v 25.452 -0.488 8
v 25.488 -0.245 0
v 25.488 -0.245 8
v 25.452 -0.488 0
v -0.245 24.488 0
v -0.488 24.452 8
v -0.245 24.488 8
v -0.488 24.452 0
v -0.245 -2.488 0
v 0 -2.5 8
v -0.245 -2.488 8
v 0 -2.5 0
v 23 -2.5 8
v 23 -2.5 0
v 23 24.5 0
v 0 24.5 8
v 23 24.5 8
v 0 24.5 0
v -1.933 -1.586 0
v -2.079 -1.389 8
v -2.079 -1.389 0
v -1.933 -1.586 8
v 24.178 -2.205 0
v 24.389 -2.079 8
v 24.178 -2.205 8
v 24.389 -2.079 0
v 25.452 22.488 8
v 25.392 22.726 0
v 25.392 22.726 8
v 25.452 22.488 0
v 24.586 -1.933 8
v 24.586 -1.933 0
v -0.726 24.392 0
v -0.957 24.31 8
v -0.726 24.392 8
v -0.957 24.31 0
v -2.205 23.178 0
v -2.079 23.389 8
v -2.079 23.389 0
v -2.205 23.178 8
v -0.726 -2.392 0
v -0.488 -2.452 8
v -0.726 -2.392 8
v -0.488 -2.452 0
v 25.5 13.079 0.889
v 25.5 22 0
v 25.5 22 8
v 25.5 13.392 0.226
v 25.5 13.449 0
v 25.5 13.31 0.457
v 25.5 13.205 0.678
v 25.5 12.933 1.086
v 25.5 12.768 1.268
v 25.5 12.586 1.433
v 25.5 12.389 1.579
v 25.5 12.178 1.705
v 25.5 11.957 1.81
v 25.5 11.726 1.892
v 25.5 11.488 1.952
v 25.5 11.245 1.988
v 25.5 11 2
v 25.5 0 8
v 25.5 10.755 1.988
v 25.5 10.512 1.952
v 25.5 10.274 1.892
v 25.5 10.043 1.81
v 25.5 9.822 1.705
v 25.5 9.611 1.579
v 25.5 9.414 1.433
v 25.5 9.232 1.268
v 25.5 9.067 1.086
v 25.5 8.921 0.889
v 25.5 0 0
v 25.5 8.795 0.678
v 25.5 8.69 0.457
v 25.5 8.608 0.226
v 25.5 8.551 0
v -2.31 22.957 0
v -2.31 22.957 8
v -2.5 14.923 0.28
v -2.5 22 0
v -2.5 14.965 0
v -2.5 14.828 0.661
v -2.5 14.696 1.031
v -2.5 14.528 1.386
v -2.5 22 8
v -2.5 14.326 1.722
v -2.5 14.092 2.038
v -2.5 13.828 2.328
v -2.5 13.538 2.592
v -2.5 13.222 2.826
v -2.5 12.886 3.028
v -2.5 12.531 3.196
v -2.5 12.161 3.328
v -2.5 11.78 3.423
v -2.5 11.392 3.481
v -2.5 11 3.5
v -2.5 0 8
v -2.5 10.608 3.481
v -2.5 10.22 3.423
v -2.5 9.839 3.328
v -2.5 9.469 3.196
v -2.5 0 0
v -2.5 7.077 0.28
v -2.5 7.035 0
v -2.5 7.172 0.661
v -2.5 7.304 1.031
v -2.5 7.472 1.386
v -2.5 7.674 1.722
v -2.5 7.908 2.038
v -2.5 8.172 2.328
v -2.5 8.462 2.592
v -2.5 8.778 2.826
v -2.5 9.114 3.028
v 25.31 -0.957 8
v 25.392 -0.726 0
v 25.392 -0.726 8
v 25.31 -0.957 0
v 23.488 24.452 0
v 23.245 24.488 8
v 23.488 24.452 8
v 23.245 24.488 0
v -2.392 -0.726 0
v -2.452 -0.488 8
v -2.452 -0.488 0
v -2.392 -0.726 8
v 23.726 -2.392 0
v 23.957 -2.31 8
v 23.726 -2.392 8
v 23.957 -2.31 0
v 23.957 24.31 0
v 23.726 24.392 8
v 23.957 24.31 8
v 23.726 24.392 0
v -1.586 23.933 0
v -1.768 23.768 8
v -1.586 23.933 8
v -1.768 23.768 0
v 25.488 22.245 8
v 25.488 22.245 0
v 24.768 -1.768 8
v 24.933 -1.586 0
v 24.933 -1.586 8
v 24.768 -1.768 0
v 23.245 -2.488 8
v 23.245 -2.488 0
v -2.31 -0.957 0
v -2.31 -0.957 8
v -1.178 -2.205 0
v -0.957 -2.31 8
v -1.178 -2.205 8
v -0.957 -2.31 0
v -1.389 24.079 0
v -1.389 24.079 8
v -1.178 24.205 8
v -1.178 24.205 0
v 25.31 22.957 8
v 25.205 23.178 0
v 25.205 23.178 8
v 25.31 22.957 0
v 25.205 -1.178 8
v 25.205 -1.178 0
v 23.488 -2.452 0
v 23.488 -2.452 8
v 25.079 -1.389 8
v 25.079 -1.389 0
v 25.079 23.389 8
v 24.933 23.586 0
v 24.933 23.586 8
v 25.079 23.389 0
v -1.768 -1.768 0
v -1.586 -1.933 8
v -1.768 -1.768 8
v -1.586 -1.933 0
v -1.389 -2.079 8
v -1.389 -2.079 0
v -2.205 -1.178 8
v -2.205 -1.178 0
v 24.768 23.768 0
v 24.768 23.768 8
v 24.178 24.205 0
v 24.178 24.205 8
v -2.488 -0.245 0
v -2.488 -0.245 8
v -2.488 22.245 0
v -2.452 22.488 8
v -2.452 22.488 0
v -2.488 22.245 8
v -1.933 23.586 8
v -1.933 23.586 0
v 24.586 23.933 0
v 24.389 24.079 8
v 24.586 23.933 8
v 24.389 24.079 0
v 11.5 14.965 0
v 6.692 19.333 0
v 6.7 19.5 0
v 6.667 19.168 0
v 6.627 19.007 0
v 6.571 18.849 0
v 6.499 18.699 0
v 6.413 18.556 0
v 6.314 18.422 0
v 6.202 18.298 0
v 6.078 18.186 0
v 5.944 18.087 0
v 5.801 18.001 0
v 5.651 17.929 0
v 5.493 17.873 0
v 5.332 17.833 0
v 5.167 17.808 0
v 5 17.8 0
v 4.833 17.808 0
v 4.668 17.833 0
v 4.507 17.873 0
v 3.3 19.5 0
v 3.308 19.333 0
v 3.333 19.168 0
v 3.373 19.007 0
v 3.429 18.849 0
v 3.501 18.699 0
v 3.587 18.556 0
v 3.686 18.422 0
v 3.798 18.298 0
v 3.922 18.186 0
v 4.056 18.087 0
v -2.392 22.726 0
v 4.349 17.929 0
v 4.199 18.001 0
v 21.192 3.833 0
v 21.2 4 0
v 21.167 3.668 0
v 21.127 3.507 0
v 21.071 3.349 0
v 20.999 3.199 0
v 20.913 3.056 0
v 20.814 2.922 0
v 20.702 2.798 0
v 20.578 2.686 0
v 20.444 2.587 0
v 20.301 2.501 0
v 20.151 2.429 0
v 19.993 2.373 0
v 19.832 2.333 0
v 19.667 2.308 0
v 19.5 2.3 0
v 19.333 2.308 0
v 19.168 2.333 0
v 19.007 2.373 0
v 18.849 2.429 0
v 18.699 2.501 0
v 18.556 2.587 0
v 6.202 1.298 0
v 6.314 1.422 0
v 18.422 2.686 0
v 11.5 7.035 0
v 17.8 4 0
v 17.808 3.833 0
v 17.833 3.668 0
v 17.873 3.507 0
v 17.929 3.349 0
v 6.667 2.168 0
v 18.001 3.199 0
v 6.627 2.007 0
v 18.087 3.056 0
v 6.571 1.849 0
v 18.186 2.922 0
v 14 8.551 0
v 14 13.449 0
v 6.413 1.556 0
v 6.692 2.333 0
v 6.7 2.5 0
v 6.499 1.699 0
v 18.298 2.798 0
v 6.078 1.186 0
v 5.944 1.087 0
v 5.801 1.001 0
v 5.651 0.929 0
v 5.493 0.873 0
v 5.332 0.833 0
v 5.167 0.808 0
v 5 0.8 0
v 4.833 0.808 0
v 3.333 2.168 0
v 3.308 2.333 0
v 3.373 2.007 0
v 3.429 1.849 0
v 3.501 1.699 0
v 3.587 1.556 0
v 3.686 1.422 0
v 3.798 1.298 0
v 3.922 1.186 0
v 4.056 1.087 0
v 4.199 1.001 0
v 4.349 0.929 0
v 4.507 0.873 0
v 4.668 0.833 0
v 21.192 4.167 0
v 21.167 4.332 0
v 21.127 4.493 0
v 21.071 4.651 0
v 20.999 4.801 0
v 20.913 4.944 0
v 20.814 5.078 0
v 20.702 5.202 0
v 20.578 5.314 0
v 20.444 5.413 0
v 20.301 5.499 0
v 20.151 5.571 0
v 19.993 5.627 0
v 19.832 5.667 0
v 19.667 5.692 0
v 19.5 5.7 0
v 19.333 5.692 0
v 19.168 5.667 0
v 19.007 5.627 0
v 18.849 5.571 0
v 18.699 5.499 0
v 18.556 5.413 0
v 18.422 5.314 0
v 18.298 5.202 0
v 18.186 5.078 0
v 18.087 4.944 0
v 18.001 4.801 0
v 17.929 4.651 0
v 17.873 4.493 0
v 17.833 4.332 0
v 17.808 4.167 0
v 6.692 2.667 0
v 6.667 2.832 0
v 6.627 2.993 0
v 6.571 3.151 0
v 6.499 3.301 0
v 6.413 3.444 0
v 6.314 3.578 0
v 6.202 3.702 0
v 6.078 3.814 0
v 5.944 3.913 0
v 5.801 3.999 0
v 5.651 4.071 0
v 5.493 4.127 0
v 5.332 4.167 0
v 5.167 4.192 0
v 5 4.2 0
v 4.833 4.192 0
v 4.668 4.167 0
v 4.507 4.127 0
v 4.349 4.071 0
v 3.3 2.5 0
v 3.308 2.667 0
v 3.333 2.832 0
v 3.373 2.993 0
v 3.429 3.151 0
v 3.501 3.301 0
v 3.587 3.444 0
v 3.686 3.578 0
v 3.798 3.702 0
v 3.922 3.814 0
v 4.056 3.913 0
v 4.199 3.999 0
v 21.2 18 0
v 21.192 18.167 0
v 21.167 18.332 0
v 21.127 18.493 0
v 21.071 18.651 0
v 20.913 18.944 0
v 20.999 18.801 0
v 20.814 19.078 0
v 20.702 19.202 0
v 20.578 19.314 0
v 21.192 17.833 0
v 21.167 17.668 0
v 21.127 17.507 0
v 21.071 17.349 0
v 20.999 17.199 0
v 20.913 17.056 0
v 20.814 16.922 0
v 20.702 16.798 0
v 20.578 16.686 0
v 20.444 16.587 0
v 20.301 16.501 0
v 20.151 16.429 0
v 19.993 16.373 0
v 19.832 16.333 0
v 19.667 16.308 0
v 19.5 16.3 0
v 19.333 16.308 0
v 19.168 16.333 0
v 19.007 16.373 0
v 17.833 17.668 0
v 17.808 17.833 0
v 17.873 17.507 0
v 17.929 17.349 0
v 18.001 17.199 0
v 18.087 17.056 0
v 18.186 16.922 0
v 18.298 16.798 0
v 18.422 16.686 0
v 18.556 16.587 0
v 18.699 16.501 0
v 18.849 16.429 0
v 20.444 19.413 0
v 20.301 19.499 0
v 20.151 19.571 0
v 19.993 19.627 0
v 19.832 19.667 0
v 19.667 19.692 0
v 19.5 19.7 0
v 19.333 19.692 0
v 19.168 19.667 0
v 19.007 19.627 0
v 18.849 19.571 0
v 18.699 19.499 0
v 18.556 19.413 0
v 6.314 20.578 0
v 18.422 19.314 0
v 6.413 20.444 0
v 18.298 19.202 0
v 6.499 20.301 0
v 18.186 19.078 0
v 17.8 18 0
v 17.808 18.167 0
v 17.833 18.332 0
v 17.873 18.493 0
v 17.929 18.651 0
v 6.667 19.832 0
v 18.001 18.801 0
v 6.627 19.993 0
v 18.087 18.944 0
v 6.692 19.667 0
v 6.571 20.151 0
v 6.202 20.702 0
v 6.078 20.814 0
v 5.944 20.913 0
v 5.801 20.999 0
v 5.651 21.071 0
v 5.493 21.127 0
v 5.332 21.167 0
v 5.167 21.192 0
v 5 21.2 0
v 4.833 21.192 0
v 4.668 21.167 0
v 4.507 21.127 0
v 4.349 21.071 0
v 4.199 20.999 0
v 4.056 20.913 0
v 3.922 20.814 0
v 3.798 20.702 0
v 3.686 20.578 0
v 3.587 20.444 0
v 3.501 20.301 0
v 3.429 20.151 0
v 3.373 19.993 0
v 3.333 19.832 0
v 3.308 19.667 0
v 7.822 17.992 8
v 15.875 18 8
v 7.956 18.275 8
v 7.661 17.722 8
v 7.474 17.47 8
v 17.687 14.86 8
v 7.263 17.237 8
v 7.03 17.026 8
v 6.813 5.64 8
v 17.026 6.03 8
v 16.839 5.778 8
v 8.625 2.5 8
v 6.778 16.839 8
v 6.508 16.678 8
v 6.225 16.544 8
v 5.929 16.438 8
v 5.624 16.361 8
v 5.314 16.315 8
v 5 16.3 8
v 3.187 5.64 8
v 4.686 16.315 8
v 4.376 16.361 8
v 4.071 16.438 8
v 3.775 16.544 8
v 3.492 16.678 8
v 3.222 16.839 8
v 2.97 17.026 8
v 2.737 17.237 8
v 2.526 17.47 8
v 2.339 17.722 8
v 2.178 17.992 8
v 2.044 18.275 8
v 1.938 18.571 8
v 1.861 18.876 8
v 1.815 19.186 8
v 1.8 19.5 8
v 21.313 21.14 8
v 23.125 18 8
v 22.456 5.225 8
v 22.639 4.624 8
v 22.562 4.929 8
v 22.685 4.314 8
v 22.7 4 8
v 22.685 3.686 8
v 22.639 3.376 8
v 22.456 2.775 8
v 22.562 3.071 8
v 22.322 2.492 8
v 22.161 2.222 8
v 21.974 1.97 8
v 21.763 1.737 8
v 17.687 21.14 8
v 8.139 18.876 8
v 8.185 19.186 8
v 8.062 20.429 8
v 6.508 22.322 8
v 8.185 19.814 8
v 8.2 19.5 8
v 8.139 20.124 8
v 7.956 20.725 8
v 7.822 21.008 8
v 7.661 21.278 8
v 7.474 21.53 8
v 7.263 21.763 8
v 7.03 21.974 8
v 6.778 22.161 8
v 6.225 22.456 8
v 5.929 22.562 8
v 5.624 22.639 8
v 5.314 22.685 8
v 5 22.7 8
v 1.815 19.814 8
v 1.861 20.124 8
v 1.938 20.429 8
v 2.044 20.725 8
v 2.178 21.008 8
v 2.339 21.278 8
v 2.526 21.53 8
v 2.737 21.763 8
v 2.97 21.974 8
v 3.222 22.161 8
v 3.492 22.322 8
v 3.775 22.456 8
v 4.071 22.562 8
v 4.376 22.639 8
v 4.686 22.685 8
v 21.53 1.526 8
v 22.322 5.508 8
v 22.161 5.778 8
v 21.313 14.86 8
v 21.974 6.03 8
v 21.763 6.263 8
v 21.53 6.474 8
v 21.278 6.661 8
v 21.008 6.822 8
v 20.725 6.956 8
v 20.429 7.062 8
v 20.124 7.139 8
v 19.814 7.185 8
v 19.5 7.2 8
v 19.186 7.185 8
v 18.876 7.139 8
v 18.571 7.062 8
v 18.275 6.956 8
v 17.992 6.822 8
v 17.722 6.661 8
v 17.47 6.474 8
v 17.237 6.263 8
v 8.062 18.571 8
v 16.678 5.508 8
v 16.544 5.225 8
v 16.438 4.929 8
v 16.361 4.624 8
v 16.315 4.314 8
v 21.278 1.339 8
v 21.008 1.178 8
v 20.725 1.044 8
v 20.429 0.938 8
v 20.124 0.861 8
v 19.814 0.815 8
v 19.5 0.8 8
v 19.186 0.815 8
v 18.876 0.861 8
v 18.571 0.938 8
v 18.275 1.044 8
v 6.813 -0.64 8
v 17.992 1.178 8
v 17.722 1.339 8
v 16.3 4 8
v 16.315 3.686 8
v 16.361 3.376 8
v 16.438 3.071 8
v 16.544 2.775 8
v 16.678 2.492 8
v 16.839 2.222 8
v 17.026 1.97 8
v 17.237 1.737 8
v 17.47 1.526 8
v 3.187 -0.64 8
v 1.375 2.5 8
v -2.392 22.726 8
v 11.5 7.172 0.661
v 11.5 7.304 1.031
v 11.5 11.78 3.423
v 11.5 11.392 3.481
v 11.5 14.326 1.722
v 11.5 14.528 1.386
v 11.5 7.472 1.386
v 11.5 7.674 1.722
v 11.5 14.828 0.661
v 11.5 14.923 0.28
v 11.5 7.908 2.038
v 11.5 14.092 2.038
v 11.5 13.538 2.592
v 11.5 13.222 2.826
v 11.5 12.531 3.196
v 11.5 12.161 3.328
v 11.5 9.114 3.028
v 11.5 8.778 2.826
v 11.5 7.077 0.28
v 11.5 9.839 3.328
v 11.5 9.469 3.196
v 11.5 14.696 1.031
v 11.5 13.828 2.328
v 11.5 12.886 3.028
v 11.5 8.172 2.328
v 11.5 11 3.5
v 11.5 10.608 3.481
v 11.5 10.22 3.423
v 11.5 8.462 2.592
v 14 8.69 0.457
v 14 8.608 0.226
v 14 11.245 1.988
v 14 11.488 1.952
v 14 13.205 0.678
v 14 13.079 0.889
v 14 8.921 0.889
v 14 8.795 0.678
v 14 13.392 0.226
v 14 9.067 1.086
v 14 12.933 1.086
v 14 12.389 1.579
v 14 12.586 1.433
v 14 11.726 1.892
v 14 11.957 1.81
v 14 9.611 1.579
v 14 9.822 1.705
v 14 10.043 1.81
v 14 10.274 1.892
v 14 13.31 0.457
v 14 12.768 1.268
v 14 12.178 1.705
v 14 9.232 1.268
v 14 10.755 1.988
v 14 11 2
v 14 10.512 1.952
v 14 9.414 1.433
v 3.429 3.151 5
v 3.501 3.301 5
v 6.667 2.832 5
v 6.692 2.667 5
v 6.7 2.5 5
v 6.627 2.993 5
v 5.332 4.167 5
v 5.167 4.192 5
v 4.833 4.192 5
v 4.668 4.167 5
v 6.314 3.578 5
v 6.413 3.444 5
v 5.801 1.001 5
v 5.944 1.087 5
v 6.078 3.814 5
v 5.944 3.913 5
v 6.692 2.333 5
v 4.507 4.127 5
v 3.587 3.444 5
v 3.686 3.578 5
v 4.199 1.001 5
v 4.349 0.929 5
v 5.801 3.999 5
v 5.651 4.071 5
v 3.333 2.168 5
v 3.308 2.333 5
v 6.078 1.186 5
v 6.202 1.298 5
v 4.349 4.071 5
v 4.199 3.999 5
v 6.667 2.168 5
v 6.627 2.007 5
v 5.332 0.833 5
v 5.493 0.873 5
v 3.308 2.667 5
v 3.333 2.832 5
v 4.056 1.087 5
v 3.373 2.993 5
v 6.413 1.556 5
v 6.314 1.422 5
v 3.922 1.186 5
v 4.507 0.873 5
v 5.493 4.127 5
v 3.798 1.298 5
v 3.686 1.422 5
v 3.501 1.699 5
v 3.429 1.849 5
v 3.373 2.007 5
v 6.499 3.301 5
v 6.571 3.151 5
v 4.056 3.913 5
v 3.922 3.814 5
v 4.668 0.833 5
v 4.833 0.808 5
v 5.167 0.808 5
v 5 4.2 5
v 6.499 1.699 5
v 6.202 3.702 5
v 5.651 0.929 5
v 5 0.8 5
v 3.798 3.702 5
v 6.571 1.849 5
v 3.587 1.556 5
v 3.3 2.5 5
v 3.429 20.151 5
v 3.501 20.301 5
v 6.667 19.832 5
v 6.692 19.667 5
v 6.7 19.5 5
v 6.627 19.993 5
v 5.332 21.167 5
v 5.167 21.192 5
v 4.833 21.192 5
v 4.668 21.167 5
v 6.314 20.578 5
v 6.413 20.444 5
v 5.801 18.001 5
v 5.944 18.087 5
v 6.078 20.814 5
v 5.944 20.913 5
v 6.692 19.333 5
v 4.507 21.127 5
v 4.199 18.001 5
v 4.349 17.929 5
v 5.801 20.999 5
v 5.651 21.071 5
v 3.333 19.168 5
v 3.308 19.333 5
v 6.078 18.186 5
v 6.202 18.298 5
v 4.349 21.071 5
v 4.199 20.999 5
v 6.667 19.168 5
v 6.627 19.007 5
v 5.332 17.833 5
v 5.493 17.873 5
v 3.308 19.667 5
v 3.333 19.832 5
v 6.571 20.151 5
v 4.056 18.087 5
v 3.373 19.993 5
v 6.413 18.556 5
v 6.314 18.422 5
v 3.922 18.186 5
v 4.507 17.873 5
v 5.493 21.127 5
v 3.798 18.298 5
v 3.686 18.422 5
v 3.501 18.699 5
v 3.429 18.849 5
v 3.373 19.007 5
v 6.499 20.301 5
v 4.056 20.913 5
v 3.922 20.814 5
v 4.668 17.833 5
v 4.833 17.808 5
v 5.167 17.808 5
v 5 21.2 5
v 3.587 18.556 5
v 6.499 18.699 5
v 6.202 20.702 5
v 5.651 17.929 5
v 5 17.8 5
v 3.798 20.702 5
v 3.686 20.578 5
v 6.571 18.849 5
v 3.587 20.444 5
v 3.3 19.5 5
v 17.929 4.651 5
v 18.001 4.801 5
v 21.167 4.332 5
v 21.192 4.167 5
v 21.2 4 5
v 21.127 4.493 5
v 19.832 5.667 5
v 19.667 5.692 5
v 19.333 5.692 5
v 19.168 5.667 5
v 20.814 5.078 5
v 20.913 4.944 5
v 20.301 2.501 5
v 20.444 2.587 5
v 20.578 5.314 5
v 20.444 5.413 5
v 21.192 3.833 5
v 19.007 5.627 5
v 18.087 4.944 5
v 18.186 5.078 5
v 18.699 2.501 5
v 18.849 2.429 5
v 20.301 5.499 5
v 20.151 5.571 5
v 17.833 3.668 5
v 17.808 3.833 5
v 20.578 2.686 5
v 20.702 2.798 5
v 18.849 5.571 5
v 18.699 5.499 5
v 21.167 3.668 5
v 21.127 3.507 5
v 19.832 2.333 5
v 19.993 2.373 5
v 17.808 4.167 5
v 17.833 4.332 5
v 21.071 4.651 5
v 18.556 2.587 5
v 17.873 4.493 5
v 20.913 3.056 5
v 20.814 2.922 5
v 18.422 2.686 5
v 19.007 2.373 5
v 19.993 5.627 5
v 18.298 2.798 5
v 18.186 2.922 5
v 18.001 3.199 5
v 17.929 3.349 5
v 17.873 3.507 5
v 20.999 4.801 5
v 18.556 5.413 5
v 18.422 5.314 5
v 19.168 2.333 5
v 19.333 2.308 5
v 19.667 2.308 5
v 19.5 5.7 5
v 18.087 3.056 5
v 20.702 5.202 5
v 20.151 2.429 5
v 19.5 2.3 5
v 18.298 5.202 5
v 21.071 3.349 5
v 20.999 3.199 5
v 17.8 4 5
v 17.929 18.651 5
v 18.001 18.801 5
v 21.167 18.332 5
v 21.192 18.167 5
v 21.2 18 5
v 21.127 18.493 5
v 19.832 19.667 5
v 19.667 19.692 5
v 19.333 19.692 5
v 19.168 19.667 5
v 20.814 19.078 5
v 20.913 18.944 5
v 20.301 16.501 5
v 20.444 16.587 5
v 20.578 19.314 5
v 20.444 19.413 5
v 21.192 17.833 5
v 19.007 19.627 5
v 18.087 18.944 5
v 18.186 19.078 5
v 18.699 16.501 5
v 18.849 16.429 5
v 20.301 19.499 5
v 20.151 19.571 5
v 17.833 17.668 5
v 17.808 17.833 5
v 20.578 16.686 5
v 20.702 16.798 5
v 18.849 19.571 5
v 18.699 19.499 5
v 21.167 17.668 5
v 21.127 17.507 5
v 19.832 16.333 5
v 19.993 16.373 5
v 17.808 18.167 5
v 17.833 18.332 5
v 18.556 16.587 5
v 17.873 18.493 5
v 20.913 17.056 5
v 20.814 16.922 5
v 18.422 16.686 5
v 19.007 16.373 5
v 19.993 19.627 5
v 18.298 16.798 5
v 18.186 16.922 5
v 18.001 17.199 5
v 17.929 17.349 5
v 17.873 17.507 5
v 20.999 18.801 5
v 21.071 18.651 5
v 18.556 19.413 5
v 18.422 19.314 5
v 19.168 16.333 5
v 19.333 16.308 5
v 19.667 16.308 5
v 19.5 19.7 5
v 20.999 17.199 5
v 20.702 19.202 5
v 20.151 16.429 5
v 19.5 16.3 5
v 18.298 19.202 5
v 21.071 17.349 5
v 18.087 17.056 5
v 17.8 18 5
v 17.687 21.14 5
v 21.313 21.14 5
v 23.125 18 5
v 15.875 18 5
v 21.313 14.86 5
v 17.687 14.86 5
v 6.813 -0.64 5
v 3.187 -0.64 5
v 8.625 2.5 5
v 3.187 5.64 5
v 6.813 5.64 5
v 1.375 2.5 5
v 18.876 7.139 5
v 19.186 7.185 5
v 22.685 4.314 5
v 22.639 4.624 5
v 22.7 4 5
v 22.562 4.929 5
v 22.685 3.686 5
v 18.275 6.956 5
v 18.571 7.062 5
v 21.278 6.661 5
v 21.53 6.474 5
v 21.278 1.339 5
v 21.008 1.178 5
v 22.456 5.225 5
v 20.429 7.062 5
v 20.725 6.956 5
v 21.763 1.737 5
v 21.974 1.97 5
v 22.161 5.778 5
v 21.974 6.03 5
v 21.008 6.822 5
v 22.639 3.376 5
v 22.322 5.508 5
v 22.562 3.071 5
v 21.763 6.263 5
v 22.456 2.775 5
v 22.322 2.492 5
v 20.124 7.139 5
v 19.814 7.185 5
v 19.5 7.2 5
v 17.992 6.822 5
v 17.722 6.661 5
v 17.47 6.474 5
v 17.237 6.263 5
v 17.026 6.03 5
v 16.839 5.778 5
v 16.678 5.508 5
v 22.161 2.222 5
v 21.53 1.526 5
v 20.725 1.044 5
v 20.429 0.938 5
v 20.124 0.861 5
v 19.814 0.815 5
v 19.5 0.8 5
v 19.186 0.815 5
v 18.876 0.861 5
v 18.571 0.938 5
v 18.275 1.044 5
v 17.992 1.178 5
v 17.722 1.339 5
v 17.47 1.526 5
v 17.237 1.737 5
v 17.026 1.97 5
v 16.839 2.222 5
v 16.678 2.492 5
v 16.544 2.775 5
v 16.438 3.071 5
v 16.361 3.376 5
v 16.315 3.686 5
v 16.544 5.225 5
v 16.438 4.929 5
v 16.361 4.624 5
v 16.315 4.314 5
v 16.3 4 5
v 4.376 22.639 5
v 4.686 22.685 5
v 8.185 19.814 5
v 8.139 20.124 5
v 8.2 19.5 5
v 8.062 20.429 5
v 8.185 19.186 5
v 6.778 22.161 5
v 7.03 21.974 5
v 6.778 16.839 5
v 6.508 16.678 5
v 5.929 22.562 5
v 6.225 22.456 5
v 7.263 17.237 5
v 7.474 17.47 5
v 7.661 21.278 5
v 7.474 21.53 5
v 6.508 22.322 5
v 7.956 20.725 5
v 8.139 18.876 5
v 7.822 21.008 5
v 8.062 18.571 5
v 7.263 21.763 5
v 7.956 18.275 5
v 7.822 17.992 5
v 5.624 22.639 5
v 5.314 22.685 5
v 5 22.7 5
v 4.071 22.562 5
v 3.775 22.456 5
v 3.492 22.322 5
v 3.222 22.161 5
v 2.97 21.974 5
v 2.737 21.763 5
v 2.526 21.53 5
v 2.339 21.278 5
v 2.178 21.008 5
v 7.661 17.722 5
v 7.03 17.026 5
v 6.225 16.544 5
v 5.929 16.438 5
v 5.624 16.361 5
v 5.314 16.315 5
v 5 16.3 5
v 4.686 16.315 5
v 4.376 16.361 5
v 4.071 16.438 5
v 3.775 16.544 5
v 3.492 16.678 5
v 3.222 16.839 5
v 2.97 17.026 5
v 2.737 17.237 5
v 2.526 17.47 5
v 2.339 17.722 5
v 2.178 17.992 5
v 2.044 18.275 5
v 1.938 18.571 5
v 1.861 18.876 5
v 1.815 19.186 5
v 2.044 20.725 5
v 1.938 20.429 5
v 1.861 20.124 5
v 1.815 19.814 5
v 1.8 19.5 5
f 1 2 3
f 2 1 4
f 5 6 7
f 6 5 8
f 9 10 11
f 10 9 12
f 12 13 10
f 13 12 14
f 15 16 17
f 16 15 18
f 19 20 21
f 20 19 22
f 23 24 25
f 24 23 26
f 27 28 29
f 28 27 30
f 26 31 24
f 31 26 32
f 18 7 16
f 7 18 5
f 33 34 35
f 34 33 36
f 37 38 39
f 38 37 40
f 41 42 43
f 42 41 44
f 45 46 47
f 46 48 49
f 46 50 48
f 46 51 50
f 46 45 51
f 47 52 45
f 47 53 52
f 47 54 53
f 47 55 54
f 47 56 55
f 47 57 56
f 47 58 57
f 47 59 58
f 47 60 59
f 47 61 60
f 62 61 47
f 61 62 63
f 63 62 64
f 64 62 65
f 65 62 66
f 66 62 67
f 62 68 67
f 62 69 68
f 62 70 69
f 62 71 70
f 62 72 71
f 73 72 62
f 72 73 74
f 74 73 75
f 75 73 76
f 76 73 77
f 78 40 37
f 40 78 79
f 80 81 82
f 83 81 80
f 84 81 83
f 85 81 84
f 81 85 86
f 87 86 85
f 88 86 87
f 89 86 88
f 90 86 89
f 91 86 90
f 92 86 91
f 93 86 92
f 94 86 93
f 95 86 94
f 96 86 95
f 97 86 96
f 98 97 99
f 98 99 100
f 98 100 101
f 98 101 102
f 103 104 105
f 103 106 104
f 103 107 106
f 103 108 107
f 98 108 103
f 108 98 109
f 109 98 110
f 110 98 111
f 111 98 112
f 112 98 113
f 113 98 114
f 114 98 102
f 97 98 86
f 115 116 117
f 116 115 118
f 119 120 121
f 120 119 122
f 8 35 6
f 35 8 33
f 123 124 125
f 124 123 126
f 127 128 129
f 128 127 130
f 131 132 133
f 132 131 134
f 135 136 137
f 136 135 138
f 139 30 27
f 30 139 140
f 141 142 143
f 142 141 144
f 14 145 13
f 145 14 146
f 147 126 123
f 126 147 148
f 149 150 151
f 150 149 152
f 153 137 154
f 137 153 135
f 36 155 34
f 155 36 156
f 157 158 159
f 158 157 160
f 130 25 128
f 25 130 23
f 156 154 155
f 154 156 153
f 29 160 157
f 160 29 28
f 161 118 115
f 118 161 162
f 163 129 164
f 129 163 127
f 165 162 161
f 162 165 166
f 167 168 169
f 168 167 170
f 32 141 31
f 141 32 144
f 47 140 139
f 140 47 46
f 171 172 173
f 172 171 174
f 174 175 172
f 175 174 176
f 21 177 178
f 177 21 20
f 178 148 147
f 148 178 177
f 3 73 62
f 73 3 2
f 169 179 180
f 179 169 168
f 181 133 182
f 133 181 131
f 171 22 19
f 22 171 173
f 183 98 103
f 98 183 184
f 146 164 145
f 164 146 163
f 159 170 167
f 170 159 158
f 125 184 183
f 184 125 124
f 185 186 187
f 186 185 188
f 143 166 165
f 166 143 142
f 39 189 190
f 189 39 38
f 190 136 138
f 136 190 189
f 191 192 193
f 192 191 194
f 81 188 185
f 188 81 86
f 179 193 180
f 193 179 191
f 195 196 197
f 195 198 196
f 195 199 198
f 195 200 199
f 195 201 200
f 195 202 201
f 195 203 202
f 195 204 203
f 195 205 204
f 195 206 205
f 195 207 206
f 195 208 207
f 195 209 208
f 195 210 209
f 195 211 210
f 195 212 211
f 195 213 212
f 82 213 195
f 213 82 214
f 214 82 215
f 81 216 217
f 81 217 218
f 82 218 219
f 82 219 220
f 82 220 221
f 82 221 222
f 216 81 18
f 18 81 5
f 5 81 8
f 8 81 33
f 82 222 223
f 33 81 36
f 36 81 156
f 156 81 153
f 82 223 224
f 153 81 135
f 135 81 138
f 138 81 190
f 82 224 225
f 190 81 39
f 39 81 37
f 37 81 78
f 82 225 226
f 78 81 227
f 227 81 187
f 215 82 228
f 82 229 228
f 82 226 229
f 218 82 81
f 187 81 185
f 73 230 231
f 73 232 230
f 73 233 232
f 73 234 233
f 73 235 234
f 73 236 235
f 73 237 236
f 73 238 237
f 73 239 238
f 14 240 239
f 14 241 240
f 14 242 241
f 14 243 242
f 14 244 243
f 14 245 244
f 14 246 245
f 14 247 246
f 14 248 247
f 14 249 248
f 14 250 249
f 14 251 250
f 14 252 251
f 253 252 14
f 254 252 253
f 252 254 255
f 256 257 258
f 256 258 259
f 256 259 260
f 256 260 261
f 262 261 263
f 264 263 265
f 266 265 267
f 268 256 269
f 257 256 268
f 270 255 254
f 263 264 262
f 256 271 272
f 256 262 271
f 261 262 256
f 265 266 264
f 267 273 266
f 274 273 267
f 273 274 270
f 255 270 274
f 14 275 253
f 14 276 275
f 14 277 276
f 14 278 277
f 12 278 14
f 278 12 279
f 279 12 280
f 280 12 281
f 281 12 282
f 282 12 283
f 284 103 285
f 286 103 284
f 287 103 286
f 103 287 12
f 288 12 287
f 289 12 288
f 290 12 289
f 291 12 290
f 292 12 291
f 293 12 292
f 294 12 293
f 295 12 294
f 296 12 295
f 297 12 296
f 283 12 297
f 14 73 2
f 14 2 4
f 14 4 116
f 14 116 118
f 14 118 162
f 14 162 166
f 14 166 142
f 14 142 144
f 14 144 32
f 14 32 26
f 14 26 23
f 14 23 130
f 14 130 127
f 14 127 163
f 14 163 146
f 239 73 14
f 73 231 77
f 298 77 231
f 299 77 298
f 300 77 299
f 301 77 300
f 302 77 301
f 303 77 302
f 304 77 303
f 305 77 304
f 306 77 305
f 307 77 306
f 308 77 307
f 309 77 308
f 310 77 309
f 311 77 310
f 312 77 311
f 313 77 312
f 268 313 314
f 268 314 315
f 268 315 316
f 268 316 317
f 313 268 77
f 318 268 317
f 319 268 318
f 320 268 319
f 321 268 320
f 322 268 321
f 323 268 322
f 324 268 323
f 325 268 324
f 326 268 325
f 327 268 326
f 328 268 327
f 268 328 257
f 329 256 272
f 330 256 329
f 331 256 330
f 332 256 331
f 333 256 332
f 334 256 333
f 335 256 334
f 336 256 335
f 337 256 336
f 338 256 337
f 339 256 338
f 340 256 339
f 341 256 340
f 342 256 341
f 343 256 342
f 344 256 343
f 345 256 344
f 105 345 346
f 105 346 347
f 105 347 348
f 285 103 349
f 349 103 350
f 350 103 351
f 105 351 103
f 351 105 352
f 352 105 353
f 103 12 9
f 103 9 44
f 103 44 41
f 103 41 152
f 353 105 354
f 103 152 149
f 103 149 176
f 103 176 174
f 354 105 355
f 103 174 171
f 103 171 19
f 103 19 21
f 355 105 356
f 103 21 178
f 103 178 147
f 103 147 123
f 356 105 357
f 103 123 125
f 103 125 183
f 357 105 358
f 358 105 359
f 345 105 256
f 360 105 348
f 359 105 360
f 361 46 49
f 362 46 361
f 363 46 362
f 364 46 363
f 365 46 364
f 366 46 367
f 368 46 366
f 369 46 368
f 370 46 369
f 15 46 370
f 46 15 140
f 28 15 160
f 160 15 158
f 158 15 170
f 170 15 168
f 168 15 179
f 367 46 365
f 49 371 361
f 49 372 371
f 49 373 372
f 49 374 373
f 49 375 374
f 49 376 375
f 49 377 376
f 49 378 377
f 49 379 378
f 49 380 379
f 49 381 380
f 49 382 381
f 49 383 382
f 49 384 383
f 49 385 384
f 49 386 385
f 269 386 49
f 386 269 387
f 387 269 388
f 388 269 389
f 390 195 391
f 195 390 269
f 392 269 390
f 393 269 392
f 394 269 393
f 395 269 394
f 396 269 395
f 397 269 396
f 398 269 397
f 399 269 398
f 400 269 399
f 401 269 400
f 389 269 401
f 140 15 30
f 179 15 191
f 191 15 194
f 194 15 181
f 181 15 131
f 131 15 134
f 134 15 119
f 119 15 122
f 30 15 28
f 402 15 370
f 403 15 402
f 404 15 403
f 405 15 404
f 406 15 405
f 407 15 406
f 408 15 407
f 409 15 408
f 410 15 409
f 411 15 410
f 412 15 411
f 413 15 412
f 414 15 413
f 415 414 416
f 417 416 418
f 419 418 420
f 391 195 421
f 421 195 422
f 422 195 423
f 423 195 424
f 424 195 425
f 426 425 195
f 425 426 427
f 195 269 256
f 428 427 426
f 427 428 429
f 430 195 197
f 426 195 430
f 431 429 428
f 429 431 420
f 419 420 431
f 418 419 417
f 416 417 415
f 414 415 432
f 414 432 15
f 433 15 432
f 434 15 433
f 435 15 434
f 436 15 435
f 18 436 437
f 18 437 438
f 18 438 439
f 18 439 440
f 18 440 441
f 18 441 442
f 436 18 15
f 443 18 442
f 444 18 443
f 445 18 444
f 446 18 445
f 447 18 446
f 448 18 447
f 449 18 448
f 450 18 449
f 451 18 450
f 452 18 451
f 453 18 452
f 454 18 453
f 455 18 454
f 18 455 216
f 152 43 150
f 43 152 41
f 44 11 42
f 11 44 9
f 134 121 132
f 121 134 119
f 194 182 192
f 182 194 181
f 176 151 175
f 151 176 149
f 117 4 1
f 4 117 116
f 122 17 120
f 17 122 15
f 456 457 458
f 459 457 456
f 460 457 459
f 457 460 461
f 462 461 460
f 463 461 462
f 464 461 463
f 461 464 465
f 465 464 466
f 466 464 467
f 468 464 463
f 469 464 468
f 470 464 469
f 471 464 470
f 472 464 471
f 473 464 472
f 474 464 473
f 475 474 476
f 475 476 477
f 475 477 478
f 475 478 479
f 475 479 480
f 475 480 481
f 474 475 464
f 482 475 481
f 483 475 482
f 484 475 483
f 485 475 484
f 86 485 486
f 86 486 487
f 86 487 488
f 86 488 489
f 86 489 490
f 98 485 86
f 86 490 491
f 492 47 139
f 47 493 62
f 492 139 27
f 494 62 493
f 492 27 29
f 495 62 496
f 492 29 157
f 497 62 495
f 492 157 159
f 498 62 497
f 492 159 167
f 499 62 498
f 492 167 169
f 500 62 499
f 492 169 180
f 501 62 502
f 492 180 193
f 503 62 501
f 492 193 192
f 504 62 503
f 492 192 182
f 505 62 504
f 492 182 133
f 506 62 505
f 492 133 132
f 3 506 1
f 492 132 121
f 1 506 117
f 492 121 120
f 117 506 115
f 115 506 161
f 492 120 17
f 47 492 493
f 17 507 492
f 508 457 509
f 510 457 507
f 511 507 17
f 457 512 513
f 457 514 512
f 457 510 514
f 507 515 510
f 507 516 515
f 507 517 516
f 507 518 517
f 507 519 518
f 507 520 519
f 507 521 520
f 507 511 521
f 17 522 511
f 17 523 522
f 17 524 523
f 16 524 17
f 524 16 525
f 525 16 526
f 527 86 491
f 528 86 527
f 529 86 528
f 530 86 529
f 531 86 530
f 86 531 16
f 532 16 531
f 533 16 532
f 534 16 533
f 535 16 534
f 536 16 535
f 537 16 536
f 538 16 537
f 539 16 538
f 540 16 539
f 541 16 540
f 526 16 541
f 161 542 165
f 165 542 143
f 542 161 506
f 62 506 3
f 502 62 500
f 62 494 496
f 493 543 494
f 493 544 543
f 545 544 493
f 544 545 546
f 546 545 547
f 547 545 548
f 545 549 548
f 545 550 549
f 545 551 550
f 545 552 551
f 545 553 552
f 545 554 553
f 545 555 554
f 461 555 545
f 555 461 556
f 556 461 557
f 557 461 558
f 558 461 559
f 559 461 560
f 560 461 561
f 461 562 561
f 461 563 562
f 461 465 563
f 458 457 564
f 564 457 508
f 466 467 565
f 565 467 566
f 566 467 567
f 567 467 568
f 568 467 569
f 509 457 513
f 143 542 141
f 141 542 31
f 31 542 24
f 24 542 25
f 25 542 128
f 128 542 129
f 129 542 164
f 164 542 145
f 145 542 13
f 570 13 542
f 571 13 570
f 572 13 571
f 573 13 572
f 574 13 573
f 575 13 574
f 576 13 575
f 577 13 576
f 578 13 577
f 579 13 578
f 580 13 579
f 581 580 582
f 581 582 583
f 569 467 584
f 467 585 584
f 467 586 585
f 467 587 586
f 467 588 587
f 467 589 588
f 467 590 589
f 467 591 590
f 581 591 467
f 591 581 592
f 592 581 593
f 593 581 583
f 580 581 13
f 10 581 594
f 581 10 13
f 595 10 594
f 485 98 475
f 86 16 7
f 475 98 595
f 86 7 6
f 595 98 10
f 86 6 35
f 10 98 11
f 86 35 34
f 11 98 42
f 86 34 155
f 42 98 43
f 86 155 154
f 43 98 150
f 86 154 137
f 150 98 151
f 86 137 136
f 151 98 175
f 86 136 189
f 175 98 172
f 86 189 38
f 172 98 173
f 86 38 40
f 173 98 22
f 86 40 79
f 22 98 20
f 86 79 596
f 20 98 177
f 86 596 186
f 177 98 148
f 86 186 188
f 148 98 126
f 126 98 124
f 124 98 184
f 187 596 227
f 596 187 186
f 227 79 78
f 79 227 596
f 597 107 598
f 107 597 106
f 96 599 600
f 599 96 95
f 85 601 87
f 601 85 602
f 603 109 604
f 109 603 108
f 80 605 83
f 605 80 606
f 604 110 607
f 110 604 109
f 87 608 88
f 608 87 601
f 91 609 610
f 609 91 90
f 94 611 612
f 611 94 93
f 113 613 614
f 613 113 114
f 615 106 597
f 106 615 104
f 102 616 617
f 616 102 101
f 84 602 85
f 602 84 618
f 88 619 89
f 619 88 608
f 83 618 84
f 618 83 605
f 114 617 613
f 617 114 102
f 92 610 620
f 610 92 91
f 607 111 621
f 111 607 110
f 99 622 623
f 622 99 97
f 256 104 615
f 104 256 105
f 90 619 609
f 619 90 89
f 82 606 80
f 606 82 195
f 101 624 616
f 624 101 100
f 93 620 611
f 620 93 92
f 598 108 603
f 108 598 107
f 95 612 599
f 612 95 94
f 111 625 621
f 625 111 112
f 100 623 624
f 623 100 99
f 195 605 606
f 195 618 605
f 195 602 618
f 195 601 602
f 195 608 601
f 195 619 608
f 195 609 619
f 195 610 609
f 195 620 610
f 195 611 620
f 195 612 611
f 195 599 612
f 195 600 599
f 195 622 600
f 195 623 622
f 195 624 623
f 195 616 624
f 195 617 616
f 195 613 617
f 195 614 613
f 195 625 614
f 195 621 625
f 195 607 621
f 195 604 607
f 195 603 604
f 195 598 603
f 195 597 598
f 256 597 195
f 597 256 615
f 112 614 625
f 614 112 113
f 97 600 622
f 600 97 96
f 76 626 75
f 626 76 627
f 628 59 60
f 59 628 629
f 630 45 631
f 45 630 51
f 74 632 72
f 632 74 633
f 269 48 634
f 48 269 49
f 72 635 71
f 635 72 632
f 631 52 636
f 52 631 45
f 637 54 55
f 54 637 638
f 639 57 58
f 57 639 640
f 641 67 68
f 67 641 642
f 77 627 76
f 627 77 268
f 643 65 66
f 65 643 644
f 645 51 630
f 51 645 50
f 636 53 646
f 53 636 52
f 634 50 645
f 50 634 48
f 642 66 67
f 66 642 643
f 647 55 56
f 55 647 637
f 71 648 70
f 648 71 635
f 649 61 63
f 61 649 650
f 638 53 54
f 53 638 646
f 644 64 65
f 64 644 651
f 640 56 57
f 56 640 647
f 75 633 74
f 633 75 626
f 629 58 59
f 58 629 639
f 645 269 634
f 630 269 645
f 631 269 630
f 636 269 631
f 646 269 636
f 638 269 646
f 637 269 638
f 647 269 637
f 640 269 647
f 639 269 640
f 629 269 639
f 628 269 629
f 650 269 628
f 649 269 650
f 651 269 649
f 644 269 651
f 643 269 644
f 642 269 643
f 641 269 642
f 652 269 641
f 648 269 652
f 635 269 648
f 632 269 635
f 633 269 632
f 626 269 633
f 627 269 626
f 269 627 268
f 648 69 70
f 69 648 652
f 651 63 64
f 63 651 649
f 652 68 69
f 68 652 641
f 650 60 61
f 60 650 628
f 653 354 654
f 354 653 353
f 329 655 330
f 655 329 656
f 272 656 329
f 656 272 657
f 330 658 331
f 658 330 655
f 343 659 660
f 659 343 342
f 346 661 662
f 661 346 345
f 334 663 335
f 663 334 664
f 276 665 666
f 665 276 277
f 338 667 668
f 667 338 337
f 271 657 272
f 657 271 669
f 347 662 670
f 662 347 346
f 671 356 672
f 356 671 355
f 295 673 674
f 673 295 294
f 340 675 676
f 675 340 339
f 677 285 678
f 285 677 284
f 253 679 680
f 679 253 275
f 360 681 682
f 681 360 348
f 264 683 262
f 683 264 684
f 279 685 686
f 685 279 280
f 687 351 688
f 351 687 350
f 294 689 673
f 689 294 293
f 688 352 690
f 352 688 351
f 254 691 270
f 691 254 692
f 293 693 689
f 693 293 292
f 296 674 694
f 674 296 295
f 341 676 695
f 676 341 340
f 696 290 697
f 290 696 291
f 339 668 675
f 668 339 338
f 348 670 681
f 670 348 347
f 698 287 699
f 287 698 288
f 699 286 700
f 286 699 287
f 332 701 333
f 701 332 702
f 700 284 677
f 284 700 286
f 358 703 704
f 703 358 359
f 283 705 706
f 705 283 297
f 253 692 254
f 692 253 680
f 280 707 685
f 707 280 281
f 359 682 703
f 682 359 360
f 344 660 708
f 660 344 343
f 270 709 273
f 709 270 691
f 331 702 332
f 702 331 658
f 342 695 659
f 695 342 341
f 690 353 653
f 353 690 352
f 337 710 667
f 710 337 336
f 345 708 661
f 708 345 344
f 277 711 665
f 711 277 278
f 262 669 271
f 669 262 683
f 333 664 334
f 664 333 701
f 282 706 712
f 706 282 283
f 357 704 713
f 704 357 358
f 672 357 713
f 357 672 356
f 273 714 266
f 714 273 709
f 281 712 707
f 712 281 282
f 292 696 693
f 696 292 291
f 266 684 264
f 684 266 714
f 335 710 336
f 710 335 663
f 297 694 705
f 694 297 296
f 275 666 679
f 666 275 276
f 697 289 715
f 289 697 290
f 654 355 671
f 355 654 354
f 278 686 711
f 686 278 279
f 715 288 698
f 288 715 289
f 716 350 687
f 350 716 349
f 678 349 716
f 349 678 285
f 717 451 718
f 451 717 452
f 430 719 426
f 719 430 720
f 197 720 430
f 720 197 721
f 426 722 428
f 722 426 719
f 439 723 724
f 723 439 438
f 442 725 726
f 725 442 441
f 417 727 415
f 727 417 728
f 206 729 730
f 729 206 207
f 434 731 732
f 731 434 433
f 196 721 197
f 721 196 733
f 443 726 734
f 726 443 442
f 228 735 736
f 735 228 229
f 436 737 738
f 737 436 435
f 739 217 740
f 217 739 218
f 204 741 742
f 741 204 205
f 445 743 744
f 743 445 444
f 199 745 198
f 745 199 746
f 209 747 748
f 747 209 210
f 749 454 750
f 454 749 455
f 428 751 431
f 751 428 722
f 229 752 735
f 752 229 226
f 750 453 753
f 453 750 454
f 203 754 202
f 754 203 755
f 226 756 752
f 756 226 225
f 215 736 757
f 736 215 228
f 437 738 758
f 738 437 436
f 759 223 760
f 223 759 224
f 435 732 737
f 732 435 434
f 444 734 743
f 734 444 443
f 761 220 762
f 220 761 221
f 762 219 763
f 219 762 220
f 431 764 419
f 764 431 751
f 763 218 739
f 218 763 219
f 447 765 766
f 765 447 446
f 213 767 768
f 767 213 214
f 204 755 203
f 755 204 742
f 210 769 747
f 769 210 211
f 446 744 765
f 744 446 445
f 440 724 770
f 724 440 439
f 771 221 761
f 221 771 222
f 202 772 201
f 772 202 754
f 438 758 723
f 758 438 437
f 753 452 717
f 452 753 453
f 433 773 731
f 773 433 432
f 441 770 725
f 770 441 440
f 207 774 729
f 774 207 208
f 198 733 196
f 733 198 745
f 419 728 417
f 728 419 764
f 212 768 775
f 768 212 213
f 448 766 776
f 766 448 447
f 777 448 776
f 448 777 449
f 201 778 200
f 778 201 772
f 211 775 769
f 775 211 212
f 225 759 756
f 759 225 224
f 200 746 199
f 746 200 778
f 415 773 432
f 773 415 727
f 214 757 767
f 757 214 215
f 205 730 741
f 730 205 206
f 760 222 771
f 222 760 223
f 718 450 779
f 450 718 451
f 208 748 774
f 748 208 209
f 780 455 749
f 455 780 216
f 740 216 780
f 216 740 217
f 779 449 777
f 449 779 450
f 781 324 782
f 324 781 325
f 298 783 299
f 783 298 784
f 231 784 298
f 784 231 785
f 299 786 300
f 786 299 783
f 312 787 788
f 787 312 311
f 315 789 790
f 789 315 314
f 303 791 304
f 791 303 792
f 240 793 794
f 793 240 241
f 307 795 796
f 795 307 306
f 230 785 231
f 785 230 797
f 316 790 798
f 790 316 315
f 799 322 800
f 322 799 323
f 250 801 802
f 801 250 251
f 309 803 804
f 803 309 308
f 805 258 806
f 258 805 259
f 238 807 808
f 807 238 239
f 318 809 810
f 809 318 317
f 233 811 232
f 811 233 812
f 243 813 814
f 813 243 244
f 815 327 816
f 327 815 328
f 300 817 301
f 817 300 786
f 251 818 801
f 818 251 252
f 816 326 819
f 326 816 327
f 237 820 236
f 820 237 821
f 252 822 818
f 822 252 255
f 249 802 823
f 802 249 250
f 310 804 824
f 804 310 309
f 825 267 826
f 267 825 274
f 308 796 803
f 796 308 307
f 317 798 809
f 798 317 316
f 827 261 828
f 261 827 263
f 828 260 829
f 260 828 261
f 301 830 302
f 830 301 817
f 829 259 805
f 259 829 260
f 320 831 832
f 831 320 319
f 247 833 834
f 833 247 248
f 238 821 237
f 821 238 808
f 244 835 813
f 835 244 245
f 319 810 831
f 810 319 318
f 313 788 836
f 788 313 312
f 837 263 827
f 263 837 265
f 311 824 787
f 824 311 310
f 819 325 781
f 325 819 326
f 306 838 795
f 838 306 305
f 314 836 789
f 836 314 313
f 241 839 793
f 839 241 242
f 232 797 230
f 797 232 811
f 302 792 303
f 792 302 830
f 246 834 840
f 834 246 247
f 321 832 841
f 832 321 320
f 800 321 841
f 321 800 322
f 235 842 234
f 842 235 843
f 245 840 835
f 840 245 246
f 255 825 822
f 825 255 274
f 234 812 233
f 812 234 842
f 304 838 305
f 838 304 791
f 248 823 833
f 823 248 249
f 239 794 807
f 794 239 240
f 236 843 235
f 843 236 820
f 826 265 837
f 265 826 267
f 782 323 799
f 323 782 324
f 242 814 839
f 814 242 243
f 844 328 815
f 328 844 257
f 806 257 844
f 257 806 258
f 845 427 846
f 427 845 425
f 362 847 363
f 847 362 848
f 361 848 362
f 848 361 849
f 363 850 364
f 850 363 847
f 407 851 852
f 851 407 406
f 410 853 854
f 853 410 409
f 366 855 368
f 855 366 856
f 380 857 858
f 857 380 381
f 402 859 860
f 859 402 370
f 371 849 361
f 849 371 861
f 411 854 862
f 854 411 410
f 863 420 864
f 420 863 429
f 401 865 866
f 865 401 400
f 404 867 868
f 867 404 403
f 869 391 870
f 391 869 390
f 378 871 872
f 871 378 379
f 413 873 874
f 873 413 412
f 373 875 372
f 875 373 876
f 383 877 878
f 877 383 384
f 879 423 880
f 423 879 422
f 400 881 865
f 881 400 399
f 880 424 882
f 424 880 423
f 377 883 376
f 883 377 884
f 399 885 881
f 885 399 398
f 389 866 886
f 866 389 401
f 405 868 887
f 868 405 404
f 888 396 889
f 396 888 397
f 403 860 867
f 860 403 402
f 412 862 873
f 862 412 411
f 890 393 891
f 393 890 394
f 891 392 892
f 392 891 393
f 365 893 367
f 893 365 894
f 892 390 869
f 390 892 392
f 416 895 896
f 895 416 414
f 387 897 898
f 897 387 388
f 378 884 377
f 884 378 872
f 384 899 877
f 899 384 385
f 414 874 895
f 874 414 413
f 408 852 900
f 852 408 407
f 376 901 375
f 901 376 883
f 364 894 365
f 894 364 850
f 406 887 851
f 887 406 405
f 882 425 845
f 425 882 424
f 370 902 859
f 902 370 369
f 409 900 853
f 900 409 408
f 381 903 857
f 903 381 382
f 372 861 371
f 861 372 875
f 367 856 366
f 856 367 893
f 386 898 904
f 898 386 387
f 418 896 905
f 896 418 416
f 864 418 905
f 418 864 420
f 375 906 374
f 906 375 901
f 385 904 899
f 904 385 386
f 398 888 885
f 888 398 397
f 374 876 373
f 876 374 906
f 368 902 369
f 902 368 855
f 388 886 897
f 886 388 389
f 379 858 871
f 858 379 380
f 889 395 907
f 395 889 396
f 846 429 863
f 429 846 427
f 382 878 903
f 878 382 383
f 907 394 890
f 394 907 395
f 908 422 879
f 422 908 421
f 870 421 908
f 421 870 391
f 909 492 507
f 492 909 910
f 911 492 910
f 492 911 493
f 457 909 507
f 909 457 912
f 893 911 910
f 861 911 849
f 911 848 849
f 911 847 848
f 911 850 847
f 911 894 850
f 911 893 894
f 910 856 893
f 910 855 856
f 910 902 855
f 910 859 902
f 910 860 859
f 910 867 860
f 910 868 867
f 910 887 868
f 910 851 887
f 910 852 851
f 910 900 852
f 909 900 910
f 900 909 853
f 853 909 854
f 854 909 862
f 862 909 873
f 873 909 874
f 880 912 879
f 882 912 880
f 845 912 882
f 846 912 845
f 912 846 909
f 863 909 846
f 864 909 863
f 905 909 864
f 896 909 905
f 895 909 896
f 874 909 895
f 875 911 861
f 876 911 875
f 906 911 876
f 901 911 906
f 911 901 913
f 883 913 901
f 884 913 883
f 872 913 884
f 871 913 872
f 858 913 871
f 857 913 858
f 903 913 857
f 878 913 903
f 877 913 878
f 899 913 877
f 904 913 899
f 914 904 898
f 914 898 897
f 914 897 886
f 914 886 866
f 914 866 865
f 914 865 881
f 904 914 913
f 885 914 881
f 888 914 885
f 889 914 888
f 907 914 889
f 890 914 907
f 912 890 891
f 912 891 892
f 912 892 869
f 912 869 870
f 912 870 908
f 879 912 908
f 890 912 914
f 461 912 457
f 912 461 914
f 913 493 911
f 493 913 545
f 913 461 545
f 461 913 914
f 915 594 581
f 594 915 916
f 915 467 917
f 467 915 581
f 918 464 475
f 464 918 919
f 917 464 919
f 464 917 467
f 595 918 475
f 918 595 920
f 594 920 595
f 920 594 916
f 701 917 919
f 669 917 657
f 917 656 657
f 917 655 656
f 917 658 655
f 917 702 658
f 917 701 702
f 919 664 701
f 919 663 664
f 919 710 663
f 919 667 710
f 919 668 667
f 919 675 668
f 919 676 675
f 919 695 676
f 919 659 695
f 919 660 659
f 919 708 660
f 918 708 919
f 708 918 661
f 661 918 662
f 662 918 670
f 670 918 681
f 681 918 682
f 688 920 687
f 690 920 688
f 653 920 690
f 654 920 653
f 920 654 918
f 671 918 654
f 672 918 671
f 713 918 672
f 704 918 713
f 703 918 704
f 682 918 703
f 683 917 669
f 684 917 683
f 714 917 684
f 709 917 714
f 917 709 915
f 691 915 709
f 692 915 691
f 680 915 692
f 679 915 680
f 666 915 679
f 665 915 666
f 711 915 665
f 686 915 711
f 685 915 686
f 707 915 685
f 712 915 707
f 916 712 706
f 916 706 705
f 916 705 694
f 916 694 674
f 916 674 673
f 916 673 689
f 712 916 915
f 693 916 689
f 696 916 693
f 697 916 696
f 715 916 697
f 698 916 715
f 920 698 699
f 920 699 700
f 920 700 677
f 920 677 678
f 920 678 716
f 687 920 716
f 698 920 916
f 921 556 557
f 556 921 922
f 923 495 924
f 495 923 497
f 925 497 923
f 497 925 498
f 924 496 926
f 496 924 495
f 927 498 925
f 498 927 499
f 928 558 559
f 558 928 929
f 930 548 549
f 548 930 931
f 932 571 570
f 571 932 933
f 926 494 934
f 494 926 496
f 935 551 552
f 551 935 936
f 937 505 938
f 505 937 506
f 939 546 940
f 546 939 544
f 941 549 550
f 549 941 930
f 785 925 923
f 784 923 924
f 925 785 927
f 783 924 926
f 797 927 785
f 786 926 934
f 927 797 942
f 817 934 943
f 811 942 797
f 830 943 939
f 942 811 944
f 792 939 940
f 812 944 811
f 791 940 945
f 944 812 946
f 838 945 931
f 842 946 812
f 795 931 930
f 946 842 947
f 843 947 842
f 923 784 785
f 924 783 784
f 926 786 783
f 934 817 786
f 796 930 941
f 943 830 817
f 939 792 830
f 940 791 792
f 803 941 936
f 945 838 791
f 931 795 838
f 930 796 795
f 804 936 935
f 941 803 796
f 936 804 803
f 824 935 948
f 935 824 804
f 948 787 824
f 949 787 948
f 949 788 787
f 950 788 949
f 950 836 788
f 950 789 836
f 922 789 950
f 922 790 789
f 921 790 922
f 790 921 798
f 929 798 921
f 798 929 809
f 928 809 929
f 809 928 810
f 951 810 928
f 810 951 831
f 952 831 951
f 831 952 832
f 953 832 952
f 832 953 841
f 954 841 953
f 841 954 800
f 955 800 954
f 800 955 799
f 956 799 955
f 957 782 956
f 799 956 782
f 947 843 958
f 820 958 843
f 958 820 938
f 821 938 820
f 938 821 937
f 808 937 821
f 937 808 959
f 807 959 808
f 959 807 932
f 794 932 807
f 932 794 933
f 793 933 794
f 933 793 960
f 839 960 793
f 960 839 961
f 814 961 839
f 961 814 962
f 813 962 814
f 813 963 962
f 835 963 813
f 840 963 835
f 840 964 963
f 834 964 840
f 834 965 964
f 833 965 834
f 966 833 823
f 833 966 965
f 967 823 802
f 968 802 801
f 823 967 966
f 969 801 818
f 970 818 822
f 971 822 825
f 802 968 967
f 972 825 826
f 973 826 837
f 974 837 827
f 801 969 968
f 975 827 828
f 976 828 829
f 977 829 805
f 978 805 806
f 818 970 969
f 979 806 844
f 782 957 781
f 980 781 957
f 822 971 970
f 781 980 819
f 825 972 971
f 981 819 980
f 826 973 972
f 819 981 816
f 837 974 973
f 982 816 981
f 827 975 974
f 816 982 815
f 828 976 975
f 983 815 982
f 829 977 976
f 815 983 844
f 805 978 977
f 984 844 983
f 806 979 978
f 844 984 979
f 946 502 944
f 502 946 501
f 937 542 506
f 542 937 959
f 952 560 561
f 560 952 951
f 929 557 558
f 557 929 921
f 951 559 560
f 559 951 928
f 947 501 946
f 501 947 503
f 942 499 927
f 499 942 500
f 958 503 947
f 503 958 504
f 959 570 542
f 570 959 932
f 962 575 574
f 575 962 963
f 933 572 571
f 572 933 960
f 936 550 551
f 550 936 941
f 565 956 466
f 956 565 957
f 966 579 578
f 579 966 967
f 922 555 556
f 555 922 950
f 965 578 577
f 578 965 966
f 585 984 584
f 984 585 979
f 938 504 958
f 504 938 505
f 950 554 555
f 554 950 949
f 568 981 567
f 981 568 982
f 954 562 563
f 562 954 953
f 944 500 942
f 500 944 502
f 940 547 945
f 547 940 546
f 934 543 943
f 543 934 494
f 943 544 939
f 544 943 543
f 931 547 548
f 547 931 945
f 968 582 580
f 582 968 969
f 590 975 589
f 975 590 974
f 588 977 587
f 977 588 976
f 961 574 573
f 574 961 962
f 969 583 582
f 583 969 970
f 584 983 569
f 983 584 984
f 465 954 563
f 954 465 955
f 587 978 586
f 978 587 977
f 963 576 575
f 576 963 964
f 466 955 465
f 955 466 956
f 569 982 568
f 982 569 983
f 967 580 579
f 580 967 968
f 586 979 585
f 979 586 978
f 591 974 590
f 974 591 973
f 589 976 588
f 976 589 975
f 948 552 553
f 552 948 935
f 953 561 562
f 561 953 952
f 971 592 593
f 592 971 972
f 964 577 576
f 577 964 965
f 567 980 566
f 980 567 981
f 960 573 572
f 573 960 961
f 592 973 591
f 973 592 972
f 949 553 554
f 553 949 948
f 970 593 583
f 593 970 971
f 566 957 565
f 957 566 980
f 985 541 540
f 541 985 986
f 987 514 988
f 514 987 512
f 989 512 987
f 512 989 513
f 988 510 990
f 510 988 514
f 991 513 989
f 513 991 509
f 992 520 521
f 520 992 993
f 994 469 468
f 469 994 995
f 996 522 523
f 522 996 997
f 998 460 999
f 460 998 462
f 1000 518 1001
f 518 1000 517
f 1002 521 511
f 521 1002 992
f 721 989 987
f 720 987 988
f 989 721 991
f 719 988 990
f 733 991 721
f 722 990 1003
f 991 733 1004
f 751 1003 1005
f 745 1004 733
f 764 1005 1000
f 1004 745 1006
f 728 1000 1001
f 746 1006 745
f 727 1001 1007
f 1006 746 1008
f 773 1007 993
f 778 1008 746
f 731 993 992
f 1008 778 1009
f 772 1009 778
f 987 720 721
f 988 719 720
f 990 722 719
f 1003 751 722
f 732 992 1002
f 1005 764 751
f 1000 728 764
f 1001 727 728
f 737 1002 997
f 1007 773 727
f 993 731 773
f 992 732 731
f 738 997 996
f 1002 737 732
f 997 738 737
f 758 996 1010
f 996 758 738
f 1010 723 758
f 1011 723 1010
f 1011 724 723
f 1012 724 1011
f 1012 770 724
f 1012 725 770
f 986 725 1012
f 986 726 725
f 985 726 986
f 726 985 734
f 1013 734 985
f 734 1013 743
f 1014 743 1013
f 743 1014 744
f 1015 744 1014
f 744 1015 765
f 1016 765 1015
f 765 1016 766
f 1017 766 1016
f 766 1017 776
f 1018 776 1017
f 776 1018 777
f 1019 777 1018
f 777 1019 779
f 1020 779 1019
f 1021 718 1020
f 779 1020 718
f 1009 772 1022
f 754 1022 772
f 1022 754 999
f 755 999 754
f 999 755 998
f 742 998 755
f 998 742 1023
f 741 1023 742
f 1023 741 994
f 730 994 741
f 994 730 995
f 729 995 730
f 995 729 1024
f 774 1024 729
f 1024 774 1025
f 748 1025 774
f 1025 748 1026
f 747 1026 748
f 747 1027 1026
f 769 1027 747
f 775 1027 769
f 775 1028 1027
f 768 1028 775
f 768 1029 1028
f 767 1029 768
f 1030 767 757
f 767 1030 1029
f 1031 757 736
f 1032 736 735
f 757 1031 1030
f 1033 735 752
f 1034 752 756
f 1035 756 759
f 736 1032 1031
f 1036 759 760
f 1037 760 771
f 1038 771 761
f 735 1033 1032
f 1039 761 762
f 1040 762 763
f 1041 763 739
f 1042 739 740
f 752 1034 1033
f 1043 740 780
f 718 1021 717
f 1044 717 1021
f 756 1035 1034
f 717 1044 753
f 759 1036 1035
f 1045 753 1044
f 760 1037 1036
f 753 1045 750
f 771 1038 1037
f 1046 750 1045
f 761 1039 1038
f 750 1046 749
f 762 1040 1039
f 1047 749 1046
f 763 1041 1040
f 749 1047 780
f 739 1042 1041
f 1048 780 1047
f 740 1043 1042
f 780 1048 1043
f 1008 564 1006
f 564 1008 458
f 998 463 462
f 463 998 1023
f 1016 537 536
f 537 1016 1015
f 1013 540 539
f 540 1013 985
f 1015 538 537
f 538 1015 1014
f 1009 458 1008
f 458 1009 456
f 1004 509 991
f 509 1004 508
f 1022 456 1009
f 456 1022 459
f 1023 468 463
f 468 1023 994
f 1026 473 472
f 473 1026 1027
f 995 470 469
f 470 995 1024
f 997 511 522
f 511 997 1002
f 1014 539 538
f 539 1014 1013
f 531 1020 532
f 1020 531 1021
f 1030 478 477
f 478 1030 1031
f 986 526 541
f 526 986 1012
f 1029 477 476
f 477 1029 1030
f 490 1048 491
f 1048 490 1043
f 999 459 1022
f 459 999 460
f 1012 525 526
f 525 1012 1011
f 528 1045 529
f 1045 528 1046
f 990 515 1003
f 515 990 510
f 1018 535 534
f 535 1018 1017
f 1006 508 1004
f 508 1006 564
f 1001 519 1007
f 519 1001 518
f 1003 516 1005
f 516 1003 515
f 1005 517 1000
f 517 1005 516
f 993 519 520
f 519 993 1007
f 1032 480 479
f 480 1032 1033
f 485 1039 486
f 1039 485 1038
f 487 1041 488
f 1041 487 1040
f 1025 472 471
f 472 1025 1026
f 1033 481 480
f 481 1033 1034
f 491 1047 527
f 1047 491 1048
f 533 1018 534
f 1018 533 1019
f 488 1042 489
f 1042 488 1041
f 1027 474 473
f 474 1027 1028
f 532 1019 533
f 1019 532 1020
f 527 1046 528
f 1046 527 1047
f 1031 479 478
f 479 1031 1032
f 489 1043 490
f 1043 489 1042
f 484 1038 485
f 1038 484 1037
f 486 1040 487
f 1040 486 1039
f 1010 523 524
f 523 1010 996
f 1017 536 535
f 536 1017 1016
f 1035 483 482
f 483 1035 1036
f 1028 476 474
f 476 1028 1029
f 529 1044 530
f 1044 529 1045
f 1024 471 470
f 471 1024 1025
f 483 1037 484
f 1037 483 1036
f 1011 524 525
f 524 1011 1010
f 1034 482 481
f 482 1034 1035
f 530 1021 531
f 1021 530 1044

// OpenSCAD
/*

Name: FB2020 Rigid Coupler
Author: Ax Smith-Laffin - AxMod Box Mods Limited (https://www.axmod.co.uk) / Sledz UK (https://www.sledz-uk.co.uk)

License: GNU GPL
License URL: http://www.gnu.org/licenses/gpl-2.0.html

*/

//Smooth Cylinders
$fn=64;

//add extra diameter to holes - use if your printer prints on the tight si
extradiameter=0.4;

//nut trap modules
module m3nut(){
cylinder(r = 5.5 / 2 / cos(180 / 6) + 0.05 +extradiameter, h=3, $fn=6);
}

//Body
difference(){
minkowski(){
cube([23,22,4]);
cylinder(d=5, h=4);
}

//Lead screw Notch
translate([-4.5,11,-0.5])
rotate([0,90,0])
cylinder(d=8,h=16);

//Stepper Notcj
translate([14,11,-0.5])
rotate([0,90,0])
cylinder(d=5,h=12);

//bolt holes
translate([5,2.5,-2])
cylinder(d=3+extradiameter,h=12);
translate([5,19.5,-2])
cylinder(d=3+extradiameter,h=12);

translate([19.5,4,-2])
cylinder(d=3+extradiameter,h=12);
translate([19.5,18,-2])
cylinder(d=3+extradiameter,h=12);

//nut traps
translate([19.5,18,5])
m3nut();
translate([5,2.5,5])
m3nut();

//Bolt head recess
translate([19.5,4,5])
cylinder(d=6+extradiameter,h=3);
translate([5,19.5,5])
cylinder(d=6+extradiameter,h=3);
}
